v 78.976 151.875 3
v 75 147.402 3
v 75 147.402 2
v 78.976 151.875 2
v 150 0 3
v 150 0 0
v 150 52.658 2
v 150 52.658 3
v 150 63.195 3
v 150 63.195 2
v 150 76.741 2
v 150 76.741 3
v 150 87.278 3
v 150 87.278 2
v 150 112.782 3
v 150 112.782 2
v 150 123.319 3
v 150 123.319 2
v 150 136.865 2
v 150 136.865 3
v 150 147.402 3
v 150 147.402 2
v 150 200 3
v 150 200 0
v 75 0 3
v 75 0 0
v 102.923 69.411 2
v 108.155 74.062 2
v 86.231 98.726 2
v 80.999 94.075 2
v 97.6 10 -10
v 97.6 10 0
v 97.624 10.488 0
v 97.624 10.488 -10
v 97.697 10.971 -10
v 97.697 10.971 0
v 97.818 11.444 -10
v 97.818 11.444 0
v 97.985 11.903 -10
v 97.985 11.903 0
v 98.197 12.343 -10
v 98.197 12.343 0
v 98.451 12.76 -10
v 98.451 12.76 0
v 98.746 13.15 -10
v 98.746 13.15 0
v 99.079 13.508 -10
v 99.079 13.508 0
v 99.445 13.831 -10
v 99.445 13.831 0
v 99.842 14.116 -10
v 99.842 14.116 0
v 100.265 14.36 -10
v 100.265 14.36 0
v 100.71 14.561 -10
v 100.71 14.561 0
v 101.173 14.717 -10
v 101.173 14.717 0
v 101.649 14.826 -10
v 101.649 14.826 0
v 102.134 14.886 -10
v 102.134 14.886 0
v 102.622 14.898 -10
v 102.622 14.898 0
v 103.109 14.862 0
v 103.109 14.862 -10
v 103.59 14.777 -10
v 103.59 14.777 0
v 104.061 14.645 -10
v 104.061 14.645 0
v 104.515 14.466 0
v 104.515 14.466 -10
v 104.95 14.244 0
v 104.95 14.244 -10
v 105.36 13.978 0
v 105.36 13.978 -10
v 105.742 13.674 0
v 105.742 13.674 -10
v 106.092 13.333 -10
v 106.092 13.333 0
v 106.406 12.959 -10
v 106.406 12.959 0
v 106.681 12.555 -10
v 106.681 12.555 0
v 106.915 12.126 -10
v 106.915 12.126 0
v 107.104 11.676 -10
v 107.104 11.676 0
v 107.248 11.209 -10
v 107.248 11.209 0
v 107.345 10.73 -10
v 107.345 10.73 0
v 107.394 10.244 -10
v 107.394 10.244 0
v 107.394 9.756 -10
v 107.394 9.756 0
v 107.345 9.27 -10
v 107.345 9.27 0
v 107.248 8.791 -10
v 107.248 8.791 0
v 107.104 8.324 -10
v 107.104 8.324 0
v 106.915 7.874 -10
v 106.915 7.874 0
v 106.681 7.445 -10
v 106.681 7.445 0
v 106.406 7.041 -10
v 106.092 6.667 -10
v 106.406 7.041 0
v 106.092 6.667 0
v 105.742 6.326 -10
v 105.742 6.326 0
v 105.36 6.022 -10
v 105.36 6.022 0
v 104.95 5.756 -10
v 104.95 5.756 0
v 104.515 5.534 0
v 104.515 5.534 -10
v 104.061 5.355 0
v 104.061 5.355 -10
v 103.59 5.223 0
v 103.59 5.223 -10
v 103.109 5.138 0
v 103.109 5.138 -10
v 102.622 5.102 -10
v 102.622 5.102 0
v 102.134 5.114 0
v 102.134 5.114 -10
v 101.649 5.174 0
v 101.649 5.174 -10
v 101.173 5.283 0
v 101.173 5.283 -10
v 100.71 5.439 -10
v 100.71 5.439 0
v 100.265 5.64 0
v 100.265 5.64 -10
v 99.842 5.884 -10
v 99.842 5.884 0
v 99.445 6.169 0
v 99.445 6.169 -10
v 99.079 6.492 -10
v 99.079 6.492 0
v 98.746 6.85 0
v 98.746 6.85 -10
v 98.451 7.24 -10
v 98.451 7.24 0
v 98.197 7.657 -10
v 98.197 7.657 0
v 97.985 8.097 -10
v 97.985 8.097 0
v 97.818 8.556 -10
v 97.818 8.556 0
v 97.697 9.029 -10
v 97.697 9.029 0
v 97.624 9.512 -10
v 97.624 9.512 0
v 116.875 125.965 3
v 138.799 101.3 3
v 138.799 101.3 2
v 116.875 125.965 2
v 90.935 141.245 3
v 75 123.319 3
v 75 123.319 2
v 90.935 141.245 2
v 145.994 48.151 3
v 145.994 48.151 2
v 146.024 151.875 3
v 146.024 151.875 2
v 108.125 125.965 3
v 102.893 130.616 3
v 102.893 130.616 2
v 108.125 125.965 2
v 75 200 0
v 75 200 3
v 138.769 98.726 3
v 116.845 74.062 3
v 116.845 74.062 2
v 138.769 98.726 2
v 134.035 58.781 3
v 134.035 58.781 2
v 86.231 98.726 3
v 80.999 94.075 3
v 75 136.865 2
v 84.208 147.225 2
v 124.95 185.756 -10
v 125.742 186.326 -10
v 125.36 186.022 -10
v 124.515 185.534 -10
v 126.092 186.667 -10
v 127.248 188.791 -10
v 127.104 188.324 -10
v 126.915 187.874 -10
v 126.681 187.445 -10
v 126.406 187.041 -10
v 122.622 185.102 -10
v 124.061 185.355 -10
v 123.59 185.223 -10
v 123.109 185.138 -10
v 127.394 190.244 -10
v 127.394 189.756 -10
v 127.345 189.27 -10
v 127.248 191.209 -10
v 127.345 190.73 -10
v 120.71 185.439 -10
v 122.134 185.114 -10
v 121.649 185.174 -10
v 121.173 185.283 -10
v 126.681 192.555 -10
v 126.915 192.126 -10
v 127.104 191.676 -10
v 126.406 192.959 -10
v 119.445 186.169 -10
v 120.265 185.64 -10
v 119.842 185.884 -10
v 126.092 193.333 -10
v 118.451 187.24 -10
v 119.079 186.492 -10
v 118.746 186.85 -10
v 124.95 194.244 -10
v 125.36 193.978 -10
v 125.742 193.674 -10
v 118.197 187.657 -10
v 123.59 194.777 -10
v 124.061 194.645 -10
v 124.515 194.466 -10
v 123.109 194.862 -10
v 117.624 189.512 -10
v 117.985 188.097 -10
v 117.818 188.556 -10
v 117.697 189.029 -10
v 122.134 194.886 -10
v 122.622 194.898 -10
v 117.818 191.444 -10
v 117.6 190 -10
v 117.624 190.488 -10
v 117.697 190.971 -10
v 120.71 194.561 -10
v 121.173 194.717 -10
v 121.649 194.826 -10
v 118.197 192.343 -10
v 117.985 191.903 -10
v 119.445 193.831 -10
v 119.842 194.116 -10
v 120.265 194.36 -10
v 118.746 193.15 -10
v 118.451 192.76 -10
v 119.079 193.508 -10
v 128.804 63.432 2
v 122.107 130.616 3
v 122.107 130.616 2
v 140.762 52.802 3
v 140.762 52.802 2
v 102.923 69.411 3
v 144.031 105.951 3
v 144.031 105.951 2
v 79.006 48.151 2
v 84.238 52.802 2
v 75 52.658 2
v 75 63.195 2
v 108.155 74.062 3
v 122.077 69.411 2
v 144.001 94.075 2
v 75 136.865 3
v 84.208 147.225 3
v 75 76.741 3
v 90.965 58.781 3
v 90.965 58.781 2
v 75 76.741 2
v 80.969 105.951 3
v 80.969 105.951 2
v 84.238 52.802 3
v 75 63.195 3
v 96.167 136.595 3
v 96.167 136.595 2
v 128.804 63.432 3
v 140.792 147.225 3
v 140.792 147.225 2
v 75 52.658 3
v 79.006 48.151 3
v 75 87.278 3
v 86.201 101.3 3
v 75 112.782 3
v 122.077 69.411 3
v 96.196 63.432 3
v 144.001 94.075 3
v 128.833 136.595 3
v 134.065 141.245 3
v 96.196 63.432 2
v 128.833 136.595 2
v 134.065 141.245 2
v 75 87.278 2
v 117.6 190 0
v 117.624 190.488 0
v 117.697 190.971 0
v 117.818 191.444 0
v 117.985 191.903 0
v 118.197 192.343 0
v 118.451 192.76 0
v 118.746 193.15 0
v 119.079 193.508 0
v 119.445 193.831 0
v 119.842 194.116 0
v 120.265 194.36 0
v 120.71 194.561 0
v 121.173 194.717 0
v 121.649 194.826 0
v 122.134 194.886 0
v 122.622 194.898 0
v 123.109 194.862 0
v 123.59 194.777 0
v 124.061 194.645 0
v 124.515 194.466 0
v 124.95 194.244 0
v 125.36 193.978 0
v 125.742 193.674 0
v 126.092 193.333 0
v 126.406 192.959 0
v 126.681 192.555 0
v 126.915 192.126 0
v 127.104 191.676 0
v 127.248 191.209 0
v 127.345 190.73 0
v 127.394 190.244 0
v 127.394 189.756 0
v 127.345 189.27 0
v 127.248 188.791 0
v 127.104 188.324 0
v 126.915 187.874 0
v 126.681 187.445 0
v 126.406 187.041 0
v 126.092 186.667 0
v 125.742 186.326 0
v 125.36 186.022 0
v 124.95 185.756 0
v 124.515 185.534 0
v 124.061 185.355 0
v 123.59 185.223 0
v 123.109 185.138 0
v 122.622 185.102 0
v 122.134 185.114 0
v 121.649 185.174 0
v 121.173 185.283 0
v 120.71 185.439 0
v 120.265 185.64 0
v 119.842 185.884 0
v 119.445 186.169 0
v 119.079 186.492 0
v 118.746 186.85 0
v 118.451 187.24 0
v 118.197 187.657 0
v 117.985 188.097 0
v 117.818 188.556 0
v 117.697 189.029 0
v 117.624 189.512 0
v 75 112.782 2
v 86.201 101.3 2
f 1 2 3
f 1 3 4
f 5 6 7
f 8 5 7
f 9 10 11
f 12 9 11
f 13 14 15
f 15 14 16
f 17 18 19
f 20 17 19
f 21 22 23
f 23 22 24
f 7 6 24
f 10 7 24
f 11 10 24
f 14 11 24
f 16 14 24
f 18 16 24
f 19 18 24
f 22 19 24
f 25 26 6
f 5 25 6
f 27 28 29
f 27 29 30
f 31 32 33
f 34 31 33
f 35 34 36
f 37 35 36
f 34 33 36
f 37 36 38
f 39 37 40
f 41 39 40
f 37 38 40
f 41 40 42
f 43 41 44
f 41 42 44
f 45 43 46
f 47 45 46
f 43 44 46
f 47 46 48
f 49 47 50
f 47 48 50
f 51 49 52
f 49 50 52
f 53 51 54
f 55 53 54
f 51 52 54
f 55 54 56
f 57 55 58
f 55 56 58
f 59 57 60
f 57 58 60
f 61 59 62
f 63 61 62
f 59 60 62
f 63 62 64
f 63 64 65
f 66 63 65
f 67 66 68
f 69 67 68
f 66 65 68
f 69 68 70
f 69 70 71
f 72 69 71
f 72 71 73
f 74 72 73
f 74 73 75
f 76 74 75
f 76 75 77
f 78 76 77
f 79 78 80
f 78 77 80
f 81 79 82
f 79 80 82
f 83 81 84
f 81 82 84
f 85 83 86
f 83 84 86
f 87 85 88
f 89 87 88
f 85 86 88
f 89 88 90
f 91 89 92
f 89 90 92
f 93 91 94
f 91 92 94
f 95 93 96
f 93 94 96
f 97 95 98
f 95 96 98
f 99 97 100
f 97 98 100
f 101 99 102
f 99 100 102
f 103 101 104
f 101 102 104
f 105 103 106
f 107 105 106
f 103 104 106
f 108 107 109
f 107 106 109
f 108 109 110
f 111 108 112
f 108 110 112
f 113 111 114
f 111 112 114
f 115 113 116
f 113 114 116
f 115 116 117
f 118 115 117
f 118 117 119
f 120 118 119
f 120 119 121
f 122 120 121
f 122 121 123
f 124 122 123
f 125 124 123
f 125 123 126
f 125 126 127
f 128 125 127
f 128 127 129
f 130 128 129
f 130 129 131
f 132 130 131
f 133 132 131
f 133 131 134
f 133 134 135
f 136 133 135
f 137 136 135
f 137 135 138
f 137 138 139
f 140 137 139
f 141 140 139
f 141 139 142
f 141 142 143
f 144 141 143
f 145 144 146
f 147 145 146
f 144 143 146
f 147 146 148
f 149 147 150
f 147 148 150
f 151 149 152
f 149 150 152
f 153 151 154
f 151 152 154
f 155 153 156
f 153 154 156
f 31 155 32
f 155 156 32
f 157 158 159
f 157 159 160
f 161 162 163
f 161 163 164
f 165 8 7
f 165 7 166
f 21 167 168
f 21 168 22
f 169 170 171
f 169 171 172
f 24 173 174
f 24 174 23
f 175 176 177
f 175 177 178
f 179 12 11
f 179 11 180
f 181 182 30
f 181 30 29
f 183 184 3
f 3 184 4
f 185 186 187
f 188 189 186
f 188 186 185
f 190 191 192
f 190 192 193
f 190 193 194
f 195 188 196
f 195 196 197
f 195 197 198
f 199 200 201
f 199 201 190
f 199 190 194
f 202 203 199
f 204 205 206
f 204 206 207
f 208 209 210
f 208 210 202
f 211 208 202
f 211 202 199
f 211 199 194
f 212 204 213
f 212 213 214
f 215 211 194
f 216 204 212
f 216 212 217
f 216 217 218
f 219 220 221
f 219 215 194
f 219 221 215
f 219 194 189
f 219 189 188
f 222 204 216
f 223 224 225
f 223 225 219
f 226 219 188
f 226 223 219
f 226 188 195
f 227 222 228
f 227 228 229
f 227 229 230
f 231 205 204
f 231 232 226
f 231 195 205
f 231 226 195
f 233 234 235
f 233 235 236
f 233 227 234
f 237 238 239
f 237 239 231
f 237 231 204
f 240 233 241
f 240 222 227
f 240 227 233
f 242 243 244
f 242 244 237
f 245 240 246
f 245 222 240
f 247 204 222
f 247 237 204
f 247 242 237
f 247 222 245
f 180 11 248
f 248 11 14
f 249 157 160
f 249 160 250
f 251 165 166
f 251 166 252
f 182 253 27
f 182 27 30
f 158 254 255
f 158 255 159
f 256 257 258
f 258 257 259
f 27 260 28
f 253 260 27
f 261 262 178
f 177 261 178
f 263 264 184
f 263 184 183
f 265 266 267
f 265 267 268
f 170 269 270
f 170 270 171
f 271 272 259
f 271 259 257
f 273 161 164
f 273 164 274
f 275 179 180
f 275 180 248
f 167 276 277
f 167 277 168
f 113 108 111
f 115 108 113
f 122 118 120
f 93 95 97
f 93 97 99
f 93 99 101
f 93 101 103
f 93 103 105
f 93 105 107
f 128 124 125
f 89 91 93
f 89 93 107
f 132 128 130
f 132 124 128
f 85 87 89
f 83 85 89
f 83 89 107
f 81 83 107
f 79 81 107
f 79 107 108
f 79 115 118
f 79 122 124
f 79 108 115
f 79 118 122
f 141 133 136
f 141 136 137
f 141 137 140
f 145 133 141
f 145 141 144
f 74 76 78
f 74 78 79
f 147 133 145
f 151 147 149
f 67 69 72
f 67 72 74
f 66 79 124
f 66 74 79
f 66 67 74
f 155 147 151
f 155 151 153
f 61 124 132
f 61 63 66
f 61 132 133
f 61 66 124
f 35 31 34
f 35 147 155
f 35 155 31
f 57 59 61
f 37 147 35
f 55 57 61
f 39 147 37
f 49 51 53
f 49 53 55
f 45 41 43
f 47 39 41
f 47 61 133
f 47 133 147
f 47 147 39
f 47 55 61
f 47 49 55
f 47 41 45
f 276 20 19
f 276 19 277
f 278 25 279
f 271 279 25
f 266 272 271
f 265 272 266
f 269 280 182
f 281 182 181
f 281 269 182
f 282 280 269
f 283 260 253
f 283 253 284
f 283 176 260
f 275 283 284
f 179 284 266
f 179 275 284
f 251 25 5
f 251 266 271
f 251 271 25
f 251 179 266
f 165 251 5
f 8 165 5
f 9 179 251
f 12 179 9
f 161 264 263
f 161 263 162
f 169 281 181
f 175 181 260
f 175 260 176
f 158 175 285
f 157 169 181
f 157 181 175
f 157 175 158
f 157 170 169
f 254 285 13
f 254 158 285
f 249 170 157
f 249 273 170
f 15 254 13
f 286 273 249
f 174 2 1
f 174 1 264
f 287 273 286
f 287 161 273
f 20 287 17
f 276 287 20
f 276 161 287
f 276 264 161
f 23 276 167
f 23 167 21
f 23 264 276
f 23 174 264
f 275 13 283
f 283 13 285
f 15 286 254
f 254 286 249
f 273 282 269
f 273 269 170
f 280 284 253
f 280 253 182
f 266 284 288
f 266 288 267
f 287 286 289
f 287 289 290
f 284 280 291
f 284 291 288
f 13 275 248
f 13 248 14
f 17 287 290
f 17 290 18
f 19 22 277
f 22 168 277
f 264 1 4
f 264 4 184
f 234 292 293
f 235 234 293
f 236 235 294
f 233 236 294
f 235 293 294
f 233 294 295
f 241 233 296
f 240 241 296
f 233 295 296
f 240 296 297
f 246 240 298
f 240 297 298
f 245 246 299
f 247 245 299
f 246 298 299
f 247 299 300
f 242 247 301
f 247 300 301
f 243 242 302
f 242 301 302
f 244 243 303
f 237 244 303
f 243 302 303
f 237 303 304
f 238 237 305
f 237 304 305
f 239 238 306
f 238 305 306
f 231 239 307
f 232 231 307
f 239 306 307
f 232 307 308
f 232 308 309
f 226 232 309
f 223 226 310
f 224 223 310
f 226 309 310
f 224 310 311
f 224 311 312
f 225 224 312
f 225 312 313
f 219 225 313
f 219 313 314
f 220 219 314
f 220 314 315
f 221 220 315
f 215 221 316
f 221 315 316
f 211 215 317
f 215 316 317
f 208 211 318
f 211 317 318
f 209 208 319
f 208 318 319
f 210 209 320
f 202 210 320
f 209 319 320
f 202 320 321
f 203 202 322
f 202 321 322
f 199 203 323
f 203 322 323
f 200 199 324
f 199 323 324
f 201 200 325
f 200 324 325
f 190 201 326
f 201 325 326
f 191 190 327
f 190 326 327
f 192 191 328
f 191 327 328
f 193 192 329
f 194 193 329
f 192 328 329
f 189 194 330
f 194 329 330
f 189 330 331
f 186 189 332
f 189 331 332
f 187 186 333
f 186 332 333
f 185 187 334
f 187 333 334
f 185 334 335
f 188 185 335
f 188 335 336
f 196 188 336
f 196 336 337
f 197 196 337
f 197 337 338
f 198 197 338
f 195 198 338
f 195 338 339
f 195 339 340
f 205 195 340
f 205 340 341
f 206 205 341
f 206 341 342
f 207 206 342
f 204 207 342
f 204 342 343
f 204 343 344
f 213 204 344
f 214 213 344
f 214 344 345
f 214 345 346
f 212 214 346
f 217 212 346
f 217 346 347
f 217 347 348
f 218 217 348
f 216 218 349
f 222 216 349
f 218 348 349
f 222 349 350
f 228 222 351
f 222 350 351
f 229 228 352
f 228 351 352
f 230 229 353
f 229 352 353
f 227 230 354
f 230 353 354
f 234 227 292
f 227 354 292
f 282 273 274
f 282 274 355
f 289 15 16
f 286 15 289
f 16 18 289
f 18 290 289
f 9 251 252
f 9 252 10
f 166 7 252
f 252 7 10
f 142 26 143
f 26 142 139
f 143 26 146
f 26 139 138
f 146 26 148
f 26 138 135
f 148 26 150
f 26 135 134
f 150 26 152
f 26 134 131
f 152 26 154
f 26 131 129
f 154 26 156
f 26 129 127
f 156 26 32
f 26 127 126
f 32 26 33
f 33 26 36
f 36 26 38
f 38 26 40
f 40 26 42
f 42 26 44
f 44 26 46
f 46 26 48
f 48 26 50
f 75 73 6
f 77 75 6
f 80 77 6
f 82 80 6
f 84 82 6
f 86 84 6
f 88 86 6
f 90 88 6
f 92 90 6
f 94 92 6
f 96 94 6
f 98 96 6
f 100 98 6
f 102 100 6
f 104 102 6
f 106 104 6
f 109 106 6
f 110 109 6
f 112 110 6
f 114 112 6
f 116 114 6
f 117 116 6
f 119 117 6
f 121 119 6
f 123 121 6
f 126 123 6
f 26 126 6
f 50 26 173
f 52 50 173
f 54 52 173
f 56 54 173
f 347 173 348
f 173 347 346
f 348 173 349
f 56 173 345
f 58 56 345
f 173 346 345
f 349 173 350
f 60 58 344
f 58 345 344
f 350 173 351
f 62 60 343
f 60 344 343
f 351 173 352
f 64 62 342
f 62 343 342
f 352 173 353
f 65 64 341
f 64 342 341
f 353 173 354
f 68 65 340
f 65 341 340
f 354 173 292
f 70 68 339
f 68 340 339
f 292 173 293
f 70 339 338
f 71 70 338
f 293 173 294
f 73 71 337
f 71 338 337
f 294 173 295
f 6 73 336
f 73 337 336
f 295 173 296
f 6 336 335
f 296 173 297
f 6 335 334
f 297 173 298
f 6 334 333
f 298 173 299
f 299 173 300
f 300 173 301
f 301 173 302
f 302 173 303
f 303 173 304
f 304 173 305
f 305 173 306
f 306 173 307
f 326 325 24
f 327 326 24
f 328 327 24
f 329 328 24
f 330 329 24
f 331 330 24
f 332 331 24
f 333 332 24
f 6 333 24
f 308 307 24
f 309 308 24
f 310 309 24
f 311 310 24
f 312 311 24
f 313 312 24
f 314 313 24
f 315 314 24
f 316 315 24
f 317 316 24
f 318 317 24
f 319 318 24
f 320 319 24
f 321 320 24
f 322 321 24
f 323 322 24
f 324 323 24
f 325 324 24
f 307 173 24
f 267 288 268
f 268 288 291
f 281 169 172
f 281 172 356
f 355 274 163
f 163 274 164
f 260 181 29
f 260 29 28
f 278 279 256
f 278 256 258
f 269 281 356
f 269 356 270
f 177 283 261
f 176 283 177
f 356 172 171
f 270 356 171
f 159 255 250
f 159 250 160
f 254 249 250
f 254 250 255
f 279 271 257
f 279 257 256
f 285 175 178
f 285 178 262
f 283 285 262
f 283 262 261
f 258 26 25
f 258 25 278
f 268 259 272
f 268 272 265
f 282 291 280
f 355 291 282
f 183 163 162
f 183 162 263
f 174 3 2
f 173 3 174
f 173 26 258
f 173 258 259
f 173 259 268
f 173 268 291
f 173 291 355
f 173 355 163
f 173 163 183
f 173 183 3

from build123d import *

# Parameters (mm, degrees)
SKETCH1_W           = 225
SKETCH1_H           = 200
BOSS_EXTRUDE1_DEPTH = 3
CUT_EXTRUDE1_DEPTH  = 1
SKETCH4_R           = 4.9
BOSS_EXTRUDE2_DEPTH = 10
SKETCH5_W           = 75
SKETCH5_H           = 200
CUT_EXTRUDE2_DEPTH  = 10


with BuildPart() as part:
    # Sketch1 → Boss-Extrude1 (new body)
    with BuildSketch(Plane.XY):
        with Locations((112.5, 100)):
            Rectangle(SKETCH1_W, SKETCH1_H)
    extrude(amount=BOSS_EXTRUDE1_DEPTH)

    # Sketch2 → Cut-Extrude1 (cut)
    with BuildSketch(Plane.XY.offset(3)):
        Polygon((21.176597363, 159.100101172), (43.100604044, 183.764608689), (48.332469275, 179.114061817), (26.408462593, 154.4495543), align=None)
        Polygon((9.218048264, 169.729922593), (31.142054945, 194.39443011), (36.373920176, 189.743883238), (14.449913495, 165.079375722), align=None)
        Polygon((33.135146462, 148.470279751), (55.059153143, 173.134787267), (60.291018374, 168.484240396), (38.367011692, 143.819732879), align=None)
        Polygon((45.093695561, 137.840458329), (67.017702242, 162.504965846), (72.249567473, 157.854418974), (50.325560791, 133.189911458), align=None)
        Polygon((57.05224466, 127.210636908), (78.976251341, 151.875144425), (84.208116572, 147.224597553), (62.28410989, 122.560090036), align=None)
        Polygon((69.010793758, 116.580815487), (90.93480044, 141.245323003), (96.166665671, 136.594776132), (74.242658989, 111.930268615), align=None)
        Polygon((80.969342857, 105.950994066), (102.893349539, 130.615501582), (108.12521477, 125.96495471), (86.201208088, 101.300447194), align=None)
        Polygon((116.844990154, 74.061529802), (138.768996836, 98.726037318), (144.000862066, 94.075490447), (122.076855385, 69.41098293), align=None)
        Polygon((128.803539253, 63.431708381), (150.727545935, 88.096215897), (155.959411165, 83.445669025), (134.035404484, 58.781161509), align=None)
        Polygon((140.762088352, 52.801886959), (162.686095033, 77.466394476), (167.917960264, 72.815847604), (145.993953583, 48.151340087), align=None)
        Polygon((152.720637451, 42.172065538), (174.644644132, 66.836573055), (179.876509363, 62.186026183), (157.952502682, 37.521518666), align=None)
        Polygon((164.67918655, 31.542244117), (186.603193231, 56.206751633), (191.835058462, 51.556204761), (169.911051781, 26.891697245), align=None)
        Polygon((176.637735649, 20.912422695), (198.56174233, 45.576930212), (203.793607561, 40.92638334), (181.86960088, 16.261875824), align=None)
        Polygon((188.596284748, 10.282601274), (210.520291429, 34.947108791), (215.75215666, 30.296561919), (193.828149979, 5.632054402), align=None)
        Polygon((198.591537407, 154.4495543), (176.667530725, 179.114061817), (181.899395956, 183.764608689), (203.823402637, 159.100101172), align=None)
        Polygon((210.550086505, 165.079375721), (188.626079824, 189.743883238), (193.857945055, 194.39443011), (215.781951736, 169.729922593), align=None)
        Polygon((186.632988308, 143.819732879), (164.708981626, 168.484240395), (169.940846857, 173.134787267), (191.864853538, 148.470279751), align=None)
        Polygon((174.674439209, 133.189911458), (152.750432527, 157.854418974), (157.982297758, 162.504965846), (179.906304439, 137.840458329), align=None)
        Polygon((162.71589011, 122.560090036), (140.791883428, 147.224597553), (146.023748659, 151.875144425), (167.94775534, 127.210636908), align=None)
        Polygon((150.757341011, 111.930268615), (128.833334329, 136.594776132), (134.06519956, 141.245323003), (155.989206242, 116.580815487), align=None)
        Polygon((138.798791912, 101.300447194), (116.87478523, 125.96495471), (122.106650461, 130.615501582), (144.030657143, 105.950994066), align=None)
        Polygon((102.923144615, 69.41098293), (80.999137934, 94.075490447), (86.231003164, 98.726037318), (108.155009846, 74.061529802), align=None)
        Polygon((90.964595516, 58.781161509), (69.040588835, 83.445669025), (74.272454065, 88.096215897), (96.196460747, 63.431708381), align=None)
        Polygon((79.006046417, 48.151340087), (57.082039736, 72.815847604), (62.313904967, 77.466394476), (84.237911648, 52.801886959), align=None)
        Polygon((67.047497318, 37.521518666), (45.123490637, 62.186026183), (50.355355868, 66.836573055), (72.279362549, 42.172065538), align=None)
        Polygon((55.088948219, 26.891697245), (33.164941538, 51.556204761), (38.396806769, 56.206751633), (60.32081345, 31.542244117), align=None)
        Polygon((43.13039912, 16.261875824), (21.206392439, 40.92638334), (26.43825767, 45.576930212), (48.362264351, 20.912422695), align=None)
        Polygon((31.171850021, 5.632054402), (9.24784334, 30.296561919), (14.479708571, 34.947108791), (36.403715252, 10.282601274), align=None)
    extrude(amount=-CUT_EXTRUDE1_DEPTH, mode=Mode.SUBTRACT)

    # Sketch4 → Boss-Extrude2 (add)
    with BuildSketch(Plane(origin=(0, 0, 0), x_dir=(-1, 0, 0), z_dir=(0, 0, -1))):
        with Locations((-102.5, 10)):
            Circle(SKETCH4_R)
        with Locations((-122.5, 190)):
            Circle(SKETCH4_R)
    extrude(amount=BOSS_EXTRUDE2_DEPTH)

    # Sketch5 → Cut-Extrude2 (cut)
    with BuildSketch(Plane(origin=(0, 0, 0), x_dir=(-1, 0, 0), z_dir=(0, 0, -1))):
        with Locations((-37.5, 100)):
            Rectangle(SKETCH5_W, SKETCH5_H)
        with Locations((-187.5, 100)):
            Rectangle(SKETCH5_W, SKETCH5_H)
    extrude(amount=-CUT_EXTRUDE2_DEPTH, mode=Mode.SUBTRACT)


solid = part.part
